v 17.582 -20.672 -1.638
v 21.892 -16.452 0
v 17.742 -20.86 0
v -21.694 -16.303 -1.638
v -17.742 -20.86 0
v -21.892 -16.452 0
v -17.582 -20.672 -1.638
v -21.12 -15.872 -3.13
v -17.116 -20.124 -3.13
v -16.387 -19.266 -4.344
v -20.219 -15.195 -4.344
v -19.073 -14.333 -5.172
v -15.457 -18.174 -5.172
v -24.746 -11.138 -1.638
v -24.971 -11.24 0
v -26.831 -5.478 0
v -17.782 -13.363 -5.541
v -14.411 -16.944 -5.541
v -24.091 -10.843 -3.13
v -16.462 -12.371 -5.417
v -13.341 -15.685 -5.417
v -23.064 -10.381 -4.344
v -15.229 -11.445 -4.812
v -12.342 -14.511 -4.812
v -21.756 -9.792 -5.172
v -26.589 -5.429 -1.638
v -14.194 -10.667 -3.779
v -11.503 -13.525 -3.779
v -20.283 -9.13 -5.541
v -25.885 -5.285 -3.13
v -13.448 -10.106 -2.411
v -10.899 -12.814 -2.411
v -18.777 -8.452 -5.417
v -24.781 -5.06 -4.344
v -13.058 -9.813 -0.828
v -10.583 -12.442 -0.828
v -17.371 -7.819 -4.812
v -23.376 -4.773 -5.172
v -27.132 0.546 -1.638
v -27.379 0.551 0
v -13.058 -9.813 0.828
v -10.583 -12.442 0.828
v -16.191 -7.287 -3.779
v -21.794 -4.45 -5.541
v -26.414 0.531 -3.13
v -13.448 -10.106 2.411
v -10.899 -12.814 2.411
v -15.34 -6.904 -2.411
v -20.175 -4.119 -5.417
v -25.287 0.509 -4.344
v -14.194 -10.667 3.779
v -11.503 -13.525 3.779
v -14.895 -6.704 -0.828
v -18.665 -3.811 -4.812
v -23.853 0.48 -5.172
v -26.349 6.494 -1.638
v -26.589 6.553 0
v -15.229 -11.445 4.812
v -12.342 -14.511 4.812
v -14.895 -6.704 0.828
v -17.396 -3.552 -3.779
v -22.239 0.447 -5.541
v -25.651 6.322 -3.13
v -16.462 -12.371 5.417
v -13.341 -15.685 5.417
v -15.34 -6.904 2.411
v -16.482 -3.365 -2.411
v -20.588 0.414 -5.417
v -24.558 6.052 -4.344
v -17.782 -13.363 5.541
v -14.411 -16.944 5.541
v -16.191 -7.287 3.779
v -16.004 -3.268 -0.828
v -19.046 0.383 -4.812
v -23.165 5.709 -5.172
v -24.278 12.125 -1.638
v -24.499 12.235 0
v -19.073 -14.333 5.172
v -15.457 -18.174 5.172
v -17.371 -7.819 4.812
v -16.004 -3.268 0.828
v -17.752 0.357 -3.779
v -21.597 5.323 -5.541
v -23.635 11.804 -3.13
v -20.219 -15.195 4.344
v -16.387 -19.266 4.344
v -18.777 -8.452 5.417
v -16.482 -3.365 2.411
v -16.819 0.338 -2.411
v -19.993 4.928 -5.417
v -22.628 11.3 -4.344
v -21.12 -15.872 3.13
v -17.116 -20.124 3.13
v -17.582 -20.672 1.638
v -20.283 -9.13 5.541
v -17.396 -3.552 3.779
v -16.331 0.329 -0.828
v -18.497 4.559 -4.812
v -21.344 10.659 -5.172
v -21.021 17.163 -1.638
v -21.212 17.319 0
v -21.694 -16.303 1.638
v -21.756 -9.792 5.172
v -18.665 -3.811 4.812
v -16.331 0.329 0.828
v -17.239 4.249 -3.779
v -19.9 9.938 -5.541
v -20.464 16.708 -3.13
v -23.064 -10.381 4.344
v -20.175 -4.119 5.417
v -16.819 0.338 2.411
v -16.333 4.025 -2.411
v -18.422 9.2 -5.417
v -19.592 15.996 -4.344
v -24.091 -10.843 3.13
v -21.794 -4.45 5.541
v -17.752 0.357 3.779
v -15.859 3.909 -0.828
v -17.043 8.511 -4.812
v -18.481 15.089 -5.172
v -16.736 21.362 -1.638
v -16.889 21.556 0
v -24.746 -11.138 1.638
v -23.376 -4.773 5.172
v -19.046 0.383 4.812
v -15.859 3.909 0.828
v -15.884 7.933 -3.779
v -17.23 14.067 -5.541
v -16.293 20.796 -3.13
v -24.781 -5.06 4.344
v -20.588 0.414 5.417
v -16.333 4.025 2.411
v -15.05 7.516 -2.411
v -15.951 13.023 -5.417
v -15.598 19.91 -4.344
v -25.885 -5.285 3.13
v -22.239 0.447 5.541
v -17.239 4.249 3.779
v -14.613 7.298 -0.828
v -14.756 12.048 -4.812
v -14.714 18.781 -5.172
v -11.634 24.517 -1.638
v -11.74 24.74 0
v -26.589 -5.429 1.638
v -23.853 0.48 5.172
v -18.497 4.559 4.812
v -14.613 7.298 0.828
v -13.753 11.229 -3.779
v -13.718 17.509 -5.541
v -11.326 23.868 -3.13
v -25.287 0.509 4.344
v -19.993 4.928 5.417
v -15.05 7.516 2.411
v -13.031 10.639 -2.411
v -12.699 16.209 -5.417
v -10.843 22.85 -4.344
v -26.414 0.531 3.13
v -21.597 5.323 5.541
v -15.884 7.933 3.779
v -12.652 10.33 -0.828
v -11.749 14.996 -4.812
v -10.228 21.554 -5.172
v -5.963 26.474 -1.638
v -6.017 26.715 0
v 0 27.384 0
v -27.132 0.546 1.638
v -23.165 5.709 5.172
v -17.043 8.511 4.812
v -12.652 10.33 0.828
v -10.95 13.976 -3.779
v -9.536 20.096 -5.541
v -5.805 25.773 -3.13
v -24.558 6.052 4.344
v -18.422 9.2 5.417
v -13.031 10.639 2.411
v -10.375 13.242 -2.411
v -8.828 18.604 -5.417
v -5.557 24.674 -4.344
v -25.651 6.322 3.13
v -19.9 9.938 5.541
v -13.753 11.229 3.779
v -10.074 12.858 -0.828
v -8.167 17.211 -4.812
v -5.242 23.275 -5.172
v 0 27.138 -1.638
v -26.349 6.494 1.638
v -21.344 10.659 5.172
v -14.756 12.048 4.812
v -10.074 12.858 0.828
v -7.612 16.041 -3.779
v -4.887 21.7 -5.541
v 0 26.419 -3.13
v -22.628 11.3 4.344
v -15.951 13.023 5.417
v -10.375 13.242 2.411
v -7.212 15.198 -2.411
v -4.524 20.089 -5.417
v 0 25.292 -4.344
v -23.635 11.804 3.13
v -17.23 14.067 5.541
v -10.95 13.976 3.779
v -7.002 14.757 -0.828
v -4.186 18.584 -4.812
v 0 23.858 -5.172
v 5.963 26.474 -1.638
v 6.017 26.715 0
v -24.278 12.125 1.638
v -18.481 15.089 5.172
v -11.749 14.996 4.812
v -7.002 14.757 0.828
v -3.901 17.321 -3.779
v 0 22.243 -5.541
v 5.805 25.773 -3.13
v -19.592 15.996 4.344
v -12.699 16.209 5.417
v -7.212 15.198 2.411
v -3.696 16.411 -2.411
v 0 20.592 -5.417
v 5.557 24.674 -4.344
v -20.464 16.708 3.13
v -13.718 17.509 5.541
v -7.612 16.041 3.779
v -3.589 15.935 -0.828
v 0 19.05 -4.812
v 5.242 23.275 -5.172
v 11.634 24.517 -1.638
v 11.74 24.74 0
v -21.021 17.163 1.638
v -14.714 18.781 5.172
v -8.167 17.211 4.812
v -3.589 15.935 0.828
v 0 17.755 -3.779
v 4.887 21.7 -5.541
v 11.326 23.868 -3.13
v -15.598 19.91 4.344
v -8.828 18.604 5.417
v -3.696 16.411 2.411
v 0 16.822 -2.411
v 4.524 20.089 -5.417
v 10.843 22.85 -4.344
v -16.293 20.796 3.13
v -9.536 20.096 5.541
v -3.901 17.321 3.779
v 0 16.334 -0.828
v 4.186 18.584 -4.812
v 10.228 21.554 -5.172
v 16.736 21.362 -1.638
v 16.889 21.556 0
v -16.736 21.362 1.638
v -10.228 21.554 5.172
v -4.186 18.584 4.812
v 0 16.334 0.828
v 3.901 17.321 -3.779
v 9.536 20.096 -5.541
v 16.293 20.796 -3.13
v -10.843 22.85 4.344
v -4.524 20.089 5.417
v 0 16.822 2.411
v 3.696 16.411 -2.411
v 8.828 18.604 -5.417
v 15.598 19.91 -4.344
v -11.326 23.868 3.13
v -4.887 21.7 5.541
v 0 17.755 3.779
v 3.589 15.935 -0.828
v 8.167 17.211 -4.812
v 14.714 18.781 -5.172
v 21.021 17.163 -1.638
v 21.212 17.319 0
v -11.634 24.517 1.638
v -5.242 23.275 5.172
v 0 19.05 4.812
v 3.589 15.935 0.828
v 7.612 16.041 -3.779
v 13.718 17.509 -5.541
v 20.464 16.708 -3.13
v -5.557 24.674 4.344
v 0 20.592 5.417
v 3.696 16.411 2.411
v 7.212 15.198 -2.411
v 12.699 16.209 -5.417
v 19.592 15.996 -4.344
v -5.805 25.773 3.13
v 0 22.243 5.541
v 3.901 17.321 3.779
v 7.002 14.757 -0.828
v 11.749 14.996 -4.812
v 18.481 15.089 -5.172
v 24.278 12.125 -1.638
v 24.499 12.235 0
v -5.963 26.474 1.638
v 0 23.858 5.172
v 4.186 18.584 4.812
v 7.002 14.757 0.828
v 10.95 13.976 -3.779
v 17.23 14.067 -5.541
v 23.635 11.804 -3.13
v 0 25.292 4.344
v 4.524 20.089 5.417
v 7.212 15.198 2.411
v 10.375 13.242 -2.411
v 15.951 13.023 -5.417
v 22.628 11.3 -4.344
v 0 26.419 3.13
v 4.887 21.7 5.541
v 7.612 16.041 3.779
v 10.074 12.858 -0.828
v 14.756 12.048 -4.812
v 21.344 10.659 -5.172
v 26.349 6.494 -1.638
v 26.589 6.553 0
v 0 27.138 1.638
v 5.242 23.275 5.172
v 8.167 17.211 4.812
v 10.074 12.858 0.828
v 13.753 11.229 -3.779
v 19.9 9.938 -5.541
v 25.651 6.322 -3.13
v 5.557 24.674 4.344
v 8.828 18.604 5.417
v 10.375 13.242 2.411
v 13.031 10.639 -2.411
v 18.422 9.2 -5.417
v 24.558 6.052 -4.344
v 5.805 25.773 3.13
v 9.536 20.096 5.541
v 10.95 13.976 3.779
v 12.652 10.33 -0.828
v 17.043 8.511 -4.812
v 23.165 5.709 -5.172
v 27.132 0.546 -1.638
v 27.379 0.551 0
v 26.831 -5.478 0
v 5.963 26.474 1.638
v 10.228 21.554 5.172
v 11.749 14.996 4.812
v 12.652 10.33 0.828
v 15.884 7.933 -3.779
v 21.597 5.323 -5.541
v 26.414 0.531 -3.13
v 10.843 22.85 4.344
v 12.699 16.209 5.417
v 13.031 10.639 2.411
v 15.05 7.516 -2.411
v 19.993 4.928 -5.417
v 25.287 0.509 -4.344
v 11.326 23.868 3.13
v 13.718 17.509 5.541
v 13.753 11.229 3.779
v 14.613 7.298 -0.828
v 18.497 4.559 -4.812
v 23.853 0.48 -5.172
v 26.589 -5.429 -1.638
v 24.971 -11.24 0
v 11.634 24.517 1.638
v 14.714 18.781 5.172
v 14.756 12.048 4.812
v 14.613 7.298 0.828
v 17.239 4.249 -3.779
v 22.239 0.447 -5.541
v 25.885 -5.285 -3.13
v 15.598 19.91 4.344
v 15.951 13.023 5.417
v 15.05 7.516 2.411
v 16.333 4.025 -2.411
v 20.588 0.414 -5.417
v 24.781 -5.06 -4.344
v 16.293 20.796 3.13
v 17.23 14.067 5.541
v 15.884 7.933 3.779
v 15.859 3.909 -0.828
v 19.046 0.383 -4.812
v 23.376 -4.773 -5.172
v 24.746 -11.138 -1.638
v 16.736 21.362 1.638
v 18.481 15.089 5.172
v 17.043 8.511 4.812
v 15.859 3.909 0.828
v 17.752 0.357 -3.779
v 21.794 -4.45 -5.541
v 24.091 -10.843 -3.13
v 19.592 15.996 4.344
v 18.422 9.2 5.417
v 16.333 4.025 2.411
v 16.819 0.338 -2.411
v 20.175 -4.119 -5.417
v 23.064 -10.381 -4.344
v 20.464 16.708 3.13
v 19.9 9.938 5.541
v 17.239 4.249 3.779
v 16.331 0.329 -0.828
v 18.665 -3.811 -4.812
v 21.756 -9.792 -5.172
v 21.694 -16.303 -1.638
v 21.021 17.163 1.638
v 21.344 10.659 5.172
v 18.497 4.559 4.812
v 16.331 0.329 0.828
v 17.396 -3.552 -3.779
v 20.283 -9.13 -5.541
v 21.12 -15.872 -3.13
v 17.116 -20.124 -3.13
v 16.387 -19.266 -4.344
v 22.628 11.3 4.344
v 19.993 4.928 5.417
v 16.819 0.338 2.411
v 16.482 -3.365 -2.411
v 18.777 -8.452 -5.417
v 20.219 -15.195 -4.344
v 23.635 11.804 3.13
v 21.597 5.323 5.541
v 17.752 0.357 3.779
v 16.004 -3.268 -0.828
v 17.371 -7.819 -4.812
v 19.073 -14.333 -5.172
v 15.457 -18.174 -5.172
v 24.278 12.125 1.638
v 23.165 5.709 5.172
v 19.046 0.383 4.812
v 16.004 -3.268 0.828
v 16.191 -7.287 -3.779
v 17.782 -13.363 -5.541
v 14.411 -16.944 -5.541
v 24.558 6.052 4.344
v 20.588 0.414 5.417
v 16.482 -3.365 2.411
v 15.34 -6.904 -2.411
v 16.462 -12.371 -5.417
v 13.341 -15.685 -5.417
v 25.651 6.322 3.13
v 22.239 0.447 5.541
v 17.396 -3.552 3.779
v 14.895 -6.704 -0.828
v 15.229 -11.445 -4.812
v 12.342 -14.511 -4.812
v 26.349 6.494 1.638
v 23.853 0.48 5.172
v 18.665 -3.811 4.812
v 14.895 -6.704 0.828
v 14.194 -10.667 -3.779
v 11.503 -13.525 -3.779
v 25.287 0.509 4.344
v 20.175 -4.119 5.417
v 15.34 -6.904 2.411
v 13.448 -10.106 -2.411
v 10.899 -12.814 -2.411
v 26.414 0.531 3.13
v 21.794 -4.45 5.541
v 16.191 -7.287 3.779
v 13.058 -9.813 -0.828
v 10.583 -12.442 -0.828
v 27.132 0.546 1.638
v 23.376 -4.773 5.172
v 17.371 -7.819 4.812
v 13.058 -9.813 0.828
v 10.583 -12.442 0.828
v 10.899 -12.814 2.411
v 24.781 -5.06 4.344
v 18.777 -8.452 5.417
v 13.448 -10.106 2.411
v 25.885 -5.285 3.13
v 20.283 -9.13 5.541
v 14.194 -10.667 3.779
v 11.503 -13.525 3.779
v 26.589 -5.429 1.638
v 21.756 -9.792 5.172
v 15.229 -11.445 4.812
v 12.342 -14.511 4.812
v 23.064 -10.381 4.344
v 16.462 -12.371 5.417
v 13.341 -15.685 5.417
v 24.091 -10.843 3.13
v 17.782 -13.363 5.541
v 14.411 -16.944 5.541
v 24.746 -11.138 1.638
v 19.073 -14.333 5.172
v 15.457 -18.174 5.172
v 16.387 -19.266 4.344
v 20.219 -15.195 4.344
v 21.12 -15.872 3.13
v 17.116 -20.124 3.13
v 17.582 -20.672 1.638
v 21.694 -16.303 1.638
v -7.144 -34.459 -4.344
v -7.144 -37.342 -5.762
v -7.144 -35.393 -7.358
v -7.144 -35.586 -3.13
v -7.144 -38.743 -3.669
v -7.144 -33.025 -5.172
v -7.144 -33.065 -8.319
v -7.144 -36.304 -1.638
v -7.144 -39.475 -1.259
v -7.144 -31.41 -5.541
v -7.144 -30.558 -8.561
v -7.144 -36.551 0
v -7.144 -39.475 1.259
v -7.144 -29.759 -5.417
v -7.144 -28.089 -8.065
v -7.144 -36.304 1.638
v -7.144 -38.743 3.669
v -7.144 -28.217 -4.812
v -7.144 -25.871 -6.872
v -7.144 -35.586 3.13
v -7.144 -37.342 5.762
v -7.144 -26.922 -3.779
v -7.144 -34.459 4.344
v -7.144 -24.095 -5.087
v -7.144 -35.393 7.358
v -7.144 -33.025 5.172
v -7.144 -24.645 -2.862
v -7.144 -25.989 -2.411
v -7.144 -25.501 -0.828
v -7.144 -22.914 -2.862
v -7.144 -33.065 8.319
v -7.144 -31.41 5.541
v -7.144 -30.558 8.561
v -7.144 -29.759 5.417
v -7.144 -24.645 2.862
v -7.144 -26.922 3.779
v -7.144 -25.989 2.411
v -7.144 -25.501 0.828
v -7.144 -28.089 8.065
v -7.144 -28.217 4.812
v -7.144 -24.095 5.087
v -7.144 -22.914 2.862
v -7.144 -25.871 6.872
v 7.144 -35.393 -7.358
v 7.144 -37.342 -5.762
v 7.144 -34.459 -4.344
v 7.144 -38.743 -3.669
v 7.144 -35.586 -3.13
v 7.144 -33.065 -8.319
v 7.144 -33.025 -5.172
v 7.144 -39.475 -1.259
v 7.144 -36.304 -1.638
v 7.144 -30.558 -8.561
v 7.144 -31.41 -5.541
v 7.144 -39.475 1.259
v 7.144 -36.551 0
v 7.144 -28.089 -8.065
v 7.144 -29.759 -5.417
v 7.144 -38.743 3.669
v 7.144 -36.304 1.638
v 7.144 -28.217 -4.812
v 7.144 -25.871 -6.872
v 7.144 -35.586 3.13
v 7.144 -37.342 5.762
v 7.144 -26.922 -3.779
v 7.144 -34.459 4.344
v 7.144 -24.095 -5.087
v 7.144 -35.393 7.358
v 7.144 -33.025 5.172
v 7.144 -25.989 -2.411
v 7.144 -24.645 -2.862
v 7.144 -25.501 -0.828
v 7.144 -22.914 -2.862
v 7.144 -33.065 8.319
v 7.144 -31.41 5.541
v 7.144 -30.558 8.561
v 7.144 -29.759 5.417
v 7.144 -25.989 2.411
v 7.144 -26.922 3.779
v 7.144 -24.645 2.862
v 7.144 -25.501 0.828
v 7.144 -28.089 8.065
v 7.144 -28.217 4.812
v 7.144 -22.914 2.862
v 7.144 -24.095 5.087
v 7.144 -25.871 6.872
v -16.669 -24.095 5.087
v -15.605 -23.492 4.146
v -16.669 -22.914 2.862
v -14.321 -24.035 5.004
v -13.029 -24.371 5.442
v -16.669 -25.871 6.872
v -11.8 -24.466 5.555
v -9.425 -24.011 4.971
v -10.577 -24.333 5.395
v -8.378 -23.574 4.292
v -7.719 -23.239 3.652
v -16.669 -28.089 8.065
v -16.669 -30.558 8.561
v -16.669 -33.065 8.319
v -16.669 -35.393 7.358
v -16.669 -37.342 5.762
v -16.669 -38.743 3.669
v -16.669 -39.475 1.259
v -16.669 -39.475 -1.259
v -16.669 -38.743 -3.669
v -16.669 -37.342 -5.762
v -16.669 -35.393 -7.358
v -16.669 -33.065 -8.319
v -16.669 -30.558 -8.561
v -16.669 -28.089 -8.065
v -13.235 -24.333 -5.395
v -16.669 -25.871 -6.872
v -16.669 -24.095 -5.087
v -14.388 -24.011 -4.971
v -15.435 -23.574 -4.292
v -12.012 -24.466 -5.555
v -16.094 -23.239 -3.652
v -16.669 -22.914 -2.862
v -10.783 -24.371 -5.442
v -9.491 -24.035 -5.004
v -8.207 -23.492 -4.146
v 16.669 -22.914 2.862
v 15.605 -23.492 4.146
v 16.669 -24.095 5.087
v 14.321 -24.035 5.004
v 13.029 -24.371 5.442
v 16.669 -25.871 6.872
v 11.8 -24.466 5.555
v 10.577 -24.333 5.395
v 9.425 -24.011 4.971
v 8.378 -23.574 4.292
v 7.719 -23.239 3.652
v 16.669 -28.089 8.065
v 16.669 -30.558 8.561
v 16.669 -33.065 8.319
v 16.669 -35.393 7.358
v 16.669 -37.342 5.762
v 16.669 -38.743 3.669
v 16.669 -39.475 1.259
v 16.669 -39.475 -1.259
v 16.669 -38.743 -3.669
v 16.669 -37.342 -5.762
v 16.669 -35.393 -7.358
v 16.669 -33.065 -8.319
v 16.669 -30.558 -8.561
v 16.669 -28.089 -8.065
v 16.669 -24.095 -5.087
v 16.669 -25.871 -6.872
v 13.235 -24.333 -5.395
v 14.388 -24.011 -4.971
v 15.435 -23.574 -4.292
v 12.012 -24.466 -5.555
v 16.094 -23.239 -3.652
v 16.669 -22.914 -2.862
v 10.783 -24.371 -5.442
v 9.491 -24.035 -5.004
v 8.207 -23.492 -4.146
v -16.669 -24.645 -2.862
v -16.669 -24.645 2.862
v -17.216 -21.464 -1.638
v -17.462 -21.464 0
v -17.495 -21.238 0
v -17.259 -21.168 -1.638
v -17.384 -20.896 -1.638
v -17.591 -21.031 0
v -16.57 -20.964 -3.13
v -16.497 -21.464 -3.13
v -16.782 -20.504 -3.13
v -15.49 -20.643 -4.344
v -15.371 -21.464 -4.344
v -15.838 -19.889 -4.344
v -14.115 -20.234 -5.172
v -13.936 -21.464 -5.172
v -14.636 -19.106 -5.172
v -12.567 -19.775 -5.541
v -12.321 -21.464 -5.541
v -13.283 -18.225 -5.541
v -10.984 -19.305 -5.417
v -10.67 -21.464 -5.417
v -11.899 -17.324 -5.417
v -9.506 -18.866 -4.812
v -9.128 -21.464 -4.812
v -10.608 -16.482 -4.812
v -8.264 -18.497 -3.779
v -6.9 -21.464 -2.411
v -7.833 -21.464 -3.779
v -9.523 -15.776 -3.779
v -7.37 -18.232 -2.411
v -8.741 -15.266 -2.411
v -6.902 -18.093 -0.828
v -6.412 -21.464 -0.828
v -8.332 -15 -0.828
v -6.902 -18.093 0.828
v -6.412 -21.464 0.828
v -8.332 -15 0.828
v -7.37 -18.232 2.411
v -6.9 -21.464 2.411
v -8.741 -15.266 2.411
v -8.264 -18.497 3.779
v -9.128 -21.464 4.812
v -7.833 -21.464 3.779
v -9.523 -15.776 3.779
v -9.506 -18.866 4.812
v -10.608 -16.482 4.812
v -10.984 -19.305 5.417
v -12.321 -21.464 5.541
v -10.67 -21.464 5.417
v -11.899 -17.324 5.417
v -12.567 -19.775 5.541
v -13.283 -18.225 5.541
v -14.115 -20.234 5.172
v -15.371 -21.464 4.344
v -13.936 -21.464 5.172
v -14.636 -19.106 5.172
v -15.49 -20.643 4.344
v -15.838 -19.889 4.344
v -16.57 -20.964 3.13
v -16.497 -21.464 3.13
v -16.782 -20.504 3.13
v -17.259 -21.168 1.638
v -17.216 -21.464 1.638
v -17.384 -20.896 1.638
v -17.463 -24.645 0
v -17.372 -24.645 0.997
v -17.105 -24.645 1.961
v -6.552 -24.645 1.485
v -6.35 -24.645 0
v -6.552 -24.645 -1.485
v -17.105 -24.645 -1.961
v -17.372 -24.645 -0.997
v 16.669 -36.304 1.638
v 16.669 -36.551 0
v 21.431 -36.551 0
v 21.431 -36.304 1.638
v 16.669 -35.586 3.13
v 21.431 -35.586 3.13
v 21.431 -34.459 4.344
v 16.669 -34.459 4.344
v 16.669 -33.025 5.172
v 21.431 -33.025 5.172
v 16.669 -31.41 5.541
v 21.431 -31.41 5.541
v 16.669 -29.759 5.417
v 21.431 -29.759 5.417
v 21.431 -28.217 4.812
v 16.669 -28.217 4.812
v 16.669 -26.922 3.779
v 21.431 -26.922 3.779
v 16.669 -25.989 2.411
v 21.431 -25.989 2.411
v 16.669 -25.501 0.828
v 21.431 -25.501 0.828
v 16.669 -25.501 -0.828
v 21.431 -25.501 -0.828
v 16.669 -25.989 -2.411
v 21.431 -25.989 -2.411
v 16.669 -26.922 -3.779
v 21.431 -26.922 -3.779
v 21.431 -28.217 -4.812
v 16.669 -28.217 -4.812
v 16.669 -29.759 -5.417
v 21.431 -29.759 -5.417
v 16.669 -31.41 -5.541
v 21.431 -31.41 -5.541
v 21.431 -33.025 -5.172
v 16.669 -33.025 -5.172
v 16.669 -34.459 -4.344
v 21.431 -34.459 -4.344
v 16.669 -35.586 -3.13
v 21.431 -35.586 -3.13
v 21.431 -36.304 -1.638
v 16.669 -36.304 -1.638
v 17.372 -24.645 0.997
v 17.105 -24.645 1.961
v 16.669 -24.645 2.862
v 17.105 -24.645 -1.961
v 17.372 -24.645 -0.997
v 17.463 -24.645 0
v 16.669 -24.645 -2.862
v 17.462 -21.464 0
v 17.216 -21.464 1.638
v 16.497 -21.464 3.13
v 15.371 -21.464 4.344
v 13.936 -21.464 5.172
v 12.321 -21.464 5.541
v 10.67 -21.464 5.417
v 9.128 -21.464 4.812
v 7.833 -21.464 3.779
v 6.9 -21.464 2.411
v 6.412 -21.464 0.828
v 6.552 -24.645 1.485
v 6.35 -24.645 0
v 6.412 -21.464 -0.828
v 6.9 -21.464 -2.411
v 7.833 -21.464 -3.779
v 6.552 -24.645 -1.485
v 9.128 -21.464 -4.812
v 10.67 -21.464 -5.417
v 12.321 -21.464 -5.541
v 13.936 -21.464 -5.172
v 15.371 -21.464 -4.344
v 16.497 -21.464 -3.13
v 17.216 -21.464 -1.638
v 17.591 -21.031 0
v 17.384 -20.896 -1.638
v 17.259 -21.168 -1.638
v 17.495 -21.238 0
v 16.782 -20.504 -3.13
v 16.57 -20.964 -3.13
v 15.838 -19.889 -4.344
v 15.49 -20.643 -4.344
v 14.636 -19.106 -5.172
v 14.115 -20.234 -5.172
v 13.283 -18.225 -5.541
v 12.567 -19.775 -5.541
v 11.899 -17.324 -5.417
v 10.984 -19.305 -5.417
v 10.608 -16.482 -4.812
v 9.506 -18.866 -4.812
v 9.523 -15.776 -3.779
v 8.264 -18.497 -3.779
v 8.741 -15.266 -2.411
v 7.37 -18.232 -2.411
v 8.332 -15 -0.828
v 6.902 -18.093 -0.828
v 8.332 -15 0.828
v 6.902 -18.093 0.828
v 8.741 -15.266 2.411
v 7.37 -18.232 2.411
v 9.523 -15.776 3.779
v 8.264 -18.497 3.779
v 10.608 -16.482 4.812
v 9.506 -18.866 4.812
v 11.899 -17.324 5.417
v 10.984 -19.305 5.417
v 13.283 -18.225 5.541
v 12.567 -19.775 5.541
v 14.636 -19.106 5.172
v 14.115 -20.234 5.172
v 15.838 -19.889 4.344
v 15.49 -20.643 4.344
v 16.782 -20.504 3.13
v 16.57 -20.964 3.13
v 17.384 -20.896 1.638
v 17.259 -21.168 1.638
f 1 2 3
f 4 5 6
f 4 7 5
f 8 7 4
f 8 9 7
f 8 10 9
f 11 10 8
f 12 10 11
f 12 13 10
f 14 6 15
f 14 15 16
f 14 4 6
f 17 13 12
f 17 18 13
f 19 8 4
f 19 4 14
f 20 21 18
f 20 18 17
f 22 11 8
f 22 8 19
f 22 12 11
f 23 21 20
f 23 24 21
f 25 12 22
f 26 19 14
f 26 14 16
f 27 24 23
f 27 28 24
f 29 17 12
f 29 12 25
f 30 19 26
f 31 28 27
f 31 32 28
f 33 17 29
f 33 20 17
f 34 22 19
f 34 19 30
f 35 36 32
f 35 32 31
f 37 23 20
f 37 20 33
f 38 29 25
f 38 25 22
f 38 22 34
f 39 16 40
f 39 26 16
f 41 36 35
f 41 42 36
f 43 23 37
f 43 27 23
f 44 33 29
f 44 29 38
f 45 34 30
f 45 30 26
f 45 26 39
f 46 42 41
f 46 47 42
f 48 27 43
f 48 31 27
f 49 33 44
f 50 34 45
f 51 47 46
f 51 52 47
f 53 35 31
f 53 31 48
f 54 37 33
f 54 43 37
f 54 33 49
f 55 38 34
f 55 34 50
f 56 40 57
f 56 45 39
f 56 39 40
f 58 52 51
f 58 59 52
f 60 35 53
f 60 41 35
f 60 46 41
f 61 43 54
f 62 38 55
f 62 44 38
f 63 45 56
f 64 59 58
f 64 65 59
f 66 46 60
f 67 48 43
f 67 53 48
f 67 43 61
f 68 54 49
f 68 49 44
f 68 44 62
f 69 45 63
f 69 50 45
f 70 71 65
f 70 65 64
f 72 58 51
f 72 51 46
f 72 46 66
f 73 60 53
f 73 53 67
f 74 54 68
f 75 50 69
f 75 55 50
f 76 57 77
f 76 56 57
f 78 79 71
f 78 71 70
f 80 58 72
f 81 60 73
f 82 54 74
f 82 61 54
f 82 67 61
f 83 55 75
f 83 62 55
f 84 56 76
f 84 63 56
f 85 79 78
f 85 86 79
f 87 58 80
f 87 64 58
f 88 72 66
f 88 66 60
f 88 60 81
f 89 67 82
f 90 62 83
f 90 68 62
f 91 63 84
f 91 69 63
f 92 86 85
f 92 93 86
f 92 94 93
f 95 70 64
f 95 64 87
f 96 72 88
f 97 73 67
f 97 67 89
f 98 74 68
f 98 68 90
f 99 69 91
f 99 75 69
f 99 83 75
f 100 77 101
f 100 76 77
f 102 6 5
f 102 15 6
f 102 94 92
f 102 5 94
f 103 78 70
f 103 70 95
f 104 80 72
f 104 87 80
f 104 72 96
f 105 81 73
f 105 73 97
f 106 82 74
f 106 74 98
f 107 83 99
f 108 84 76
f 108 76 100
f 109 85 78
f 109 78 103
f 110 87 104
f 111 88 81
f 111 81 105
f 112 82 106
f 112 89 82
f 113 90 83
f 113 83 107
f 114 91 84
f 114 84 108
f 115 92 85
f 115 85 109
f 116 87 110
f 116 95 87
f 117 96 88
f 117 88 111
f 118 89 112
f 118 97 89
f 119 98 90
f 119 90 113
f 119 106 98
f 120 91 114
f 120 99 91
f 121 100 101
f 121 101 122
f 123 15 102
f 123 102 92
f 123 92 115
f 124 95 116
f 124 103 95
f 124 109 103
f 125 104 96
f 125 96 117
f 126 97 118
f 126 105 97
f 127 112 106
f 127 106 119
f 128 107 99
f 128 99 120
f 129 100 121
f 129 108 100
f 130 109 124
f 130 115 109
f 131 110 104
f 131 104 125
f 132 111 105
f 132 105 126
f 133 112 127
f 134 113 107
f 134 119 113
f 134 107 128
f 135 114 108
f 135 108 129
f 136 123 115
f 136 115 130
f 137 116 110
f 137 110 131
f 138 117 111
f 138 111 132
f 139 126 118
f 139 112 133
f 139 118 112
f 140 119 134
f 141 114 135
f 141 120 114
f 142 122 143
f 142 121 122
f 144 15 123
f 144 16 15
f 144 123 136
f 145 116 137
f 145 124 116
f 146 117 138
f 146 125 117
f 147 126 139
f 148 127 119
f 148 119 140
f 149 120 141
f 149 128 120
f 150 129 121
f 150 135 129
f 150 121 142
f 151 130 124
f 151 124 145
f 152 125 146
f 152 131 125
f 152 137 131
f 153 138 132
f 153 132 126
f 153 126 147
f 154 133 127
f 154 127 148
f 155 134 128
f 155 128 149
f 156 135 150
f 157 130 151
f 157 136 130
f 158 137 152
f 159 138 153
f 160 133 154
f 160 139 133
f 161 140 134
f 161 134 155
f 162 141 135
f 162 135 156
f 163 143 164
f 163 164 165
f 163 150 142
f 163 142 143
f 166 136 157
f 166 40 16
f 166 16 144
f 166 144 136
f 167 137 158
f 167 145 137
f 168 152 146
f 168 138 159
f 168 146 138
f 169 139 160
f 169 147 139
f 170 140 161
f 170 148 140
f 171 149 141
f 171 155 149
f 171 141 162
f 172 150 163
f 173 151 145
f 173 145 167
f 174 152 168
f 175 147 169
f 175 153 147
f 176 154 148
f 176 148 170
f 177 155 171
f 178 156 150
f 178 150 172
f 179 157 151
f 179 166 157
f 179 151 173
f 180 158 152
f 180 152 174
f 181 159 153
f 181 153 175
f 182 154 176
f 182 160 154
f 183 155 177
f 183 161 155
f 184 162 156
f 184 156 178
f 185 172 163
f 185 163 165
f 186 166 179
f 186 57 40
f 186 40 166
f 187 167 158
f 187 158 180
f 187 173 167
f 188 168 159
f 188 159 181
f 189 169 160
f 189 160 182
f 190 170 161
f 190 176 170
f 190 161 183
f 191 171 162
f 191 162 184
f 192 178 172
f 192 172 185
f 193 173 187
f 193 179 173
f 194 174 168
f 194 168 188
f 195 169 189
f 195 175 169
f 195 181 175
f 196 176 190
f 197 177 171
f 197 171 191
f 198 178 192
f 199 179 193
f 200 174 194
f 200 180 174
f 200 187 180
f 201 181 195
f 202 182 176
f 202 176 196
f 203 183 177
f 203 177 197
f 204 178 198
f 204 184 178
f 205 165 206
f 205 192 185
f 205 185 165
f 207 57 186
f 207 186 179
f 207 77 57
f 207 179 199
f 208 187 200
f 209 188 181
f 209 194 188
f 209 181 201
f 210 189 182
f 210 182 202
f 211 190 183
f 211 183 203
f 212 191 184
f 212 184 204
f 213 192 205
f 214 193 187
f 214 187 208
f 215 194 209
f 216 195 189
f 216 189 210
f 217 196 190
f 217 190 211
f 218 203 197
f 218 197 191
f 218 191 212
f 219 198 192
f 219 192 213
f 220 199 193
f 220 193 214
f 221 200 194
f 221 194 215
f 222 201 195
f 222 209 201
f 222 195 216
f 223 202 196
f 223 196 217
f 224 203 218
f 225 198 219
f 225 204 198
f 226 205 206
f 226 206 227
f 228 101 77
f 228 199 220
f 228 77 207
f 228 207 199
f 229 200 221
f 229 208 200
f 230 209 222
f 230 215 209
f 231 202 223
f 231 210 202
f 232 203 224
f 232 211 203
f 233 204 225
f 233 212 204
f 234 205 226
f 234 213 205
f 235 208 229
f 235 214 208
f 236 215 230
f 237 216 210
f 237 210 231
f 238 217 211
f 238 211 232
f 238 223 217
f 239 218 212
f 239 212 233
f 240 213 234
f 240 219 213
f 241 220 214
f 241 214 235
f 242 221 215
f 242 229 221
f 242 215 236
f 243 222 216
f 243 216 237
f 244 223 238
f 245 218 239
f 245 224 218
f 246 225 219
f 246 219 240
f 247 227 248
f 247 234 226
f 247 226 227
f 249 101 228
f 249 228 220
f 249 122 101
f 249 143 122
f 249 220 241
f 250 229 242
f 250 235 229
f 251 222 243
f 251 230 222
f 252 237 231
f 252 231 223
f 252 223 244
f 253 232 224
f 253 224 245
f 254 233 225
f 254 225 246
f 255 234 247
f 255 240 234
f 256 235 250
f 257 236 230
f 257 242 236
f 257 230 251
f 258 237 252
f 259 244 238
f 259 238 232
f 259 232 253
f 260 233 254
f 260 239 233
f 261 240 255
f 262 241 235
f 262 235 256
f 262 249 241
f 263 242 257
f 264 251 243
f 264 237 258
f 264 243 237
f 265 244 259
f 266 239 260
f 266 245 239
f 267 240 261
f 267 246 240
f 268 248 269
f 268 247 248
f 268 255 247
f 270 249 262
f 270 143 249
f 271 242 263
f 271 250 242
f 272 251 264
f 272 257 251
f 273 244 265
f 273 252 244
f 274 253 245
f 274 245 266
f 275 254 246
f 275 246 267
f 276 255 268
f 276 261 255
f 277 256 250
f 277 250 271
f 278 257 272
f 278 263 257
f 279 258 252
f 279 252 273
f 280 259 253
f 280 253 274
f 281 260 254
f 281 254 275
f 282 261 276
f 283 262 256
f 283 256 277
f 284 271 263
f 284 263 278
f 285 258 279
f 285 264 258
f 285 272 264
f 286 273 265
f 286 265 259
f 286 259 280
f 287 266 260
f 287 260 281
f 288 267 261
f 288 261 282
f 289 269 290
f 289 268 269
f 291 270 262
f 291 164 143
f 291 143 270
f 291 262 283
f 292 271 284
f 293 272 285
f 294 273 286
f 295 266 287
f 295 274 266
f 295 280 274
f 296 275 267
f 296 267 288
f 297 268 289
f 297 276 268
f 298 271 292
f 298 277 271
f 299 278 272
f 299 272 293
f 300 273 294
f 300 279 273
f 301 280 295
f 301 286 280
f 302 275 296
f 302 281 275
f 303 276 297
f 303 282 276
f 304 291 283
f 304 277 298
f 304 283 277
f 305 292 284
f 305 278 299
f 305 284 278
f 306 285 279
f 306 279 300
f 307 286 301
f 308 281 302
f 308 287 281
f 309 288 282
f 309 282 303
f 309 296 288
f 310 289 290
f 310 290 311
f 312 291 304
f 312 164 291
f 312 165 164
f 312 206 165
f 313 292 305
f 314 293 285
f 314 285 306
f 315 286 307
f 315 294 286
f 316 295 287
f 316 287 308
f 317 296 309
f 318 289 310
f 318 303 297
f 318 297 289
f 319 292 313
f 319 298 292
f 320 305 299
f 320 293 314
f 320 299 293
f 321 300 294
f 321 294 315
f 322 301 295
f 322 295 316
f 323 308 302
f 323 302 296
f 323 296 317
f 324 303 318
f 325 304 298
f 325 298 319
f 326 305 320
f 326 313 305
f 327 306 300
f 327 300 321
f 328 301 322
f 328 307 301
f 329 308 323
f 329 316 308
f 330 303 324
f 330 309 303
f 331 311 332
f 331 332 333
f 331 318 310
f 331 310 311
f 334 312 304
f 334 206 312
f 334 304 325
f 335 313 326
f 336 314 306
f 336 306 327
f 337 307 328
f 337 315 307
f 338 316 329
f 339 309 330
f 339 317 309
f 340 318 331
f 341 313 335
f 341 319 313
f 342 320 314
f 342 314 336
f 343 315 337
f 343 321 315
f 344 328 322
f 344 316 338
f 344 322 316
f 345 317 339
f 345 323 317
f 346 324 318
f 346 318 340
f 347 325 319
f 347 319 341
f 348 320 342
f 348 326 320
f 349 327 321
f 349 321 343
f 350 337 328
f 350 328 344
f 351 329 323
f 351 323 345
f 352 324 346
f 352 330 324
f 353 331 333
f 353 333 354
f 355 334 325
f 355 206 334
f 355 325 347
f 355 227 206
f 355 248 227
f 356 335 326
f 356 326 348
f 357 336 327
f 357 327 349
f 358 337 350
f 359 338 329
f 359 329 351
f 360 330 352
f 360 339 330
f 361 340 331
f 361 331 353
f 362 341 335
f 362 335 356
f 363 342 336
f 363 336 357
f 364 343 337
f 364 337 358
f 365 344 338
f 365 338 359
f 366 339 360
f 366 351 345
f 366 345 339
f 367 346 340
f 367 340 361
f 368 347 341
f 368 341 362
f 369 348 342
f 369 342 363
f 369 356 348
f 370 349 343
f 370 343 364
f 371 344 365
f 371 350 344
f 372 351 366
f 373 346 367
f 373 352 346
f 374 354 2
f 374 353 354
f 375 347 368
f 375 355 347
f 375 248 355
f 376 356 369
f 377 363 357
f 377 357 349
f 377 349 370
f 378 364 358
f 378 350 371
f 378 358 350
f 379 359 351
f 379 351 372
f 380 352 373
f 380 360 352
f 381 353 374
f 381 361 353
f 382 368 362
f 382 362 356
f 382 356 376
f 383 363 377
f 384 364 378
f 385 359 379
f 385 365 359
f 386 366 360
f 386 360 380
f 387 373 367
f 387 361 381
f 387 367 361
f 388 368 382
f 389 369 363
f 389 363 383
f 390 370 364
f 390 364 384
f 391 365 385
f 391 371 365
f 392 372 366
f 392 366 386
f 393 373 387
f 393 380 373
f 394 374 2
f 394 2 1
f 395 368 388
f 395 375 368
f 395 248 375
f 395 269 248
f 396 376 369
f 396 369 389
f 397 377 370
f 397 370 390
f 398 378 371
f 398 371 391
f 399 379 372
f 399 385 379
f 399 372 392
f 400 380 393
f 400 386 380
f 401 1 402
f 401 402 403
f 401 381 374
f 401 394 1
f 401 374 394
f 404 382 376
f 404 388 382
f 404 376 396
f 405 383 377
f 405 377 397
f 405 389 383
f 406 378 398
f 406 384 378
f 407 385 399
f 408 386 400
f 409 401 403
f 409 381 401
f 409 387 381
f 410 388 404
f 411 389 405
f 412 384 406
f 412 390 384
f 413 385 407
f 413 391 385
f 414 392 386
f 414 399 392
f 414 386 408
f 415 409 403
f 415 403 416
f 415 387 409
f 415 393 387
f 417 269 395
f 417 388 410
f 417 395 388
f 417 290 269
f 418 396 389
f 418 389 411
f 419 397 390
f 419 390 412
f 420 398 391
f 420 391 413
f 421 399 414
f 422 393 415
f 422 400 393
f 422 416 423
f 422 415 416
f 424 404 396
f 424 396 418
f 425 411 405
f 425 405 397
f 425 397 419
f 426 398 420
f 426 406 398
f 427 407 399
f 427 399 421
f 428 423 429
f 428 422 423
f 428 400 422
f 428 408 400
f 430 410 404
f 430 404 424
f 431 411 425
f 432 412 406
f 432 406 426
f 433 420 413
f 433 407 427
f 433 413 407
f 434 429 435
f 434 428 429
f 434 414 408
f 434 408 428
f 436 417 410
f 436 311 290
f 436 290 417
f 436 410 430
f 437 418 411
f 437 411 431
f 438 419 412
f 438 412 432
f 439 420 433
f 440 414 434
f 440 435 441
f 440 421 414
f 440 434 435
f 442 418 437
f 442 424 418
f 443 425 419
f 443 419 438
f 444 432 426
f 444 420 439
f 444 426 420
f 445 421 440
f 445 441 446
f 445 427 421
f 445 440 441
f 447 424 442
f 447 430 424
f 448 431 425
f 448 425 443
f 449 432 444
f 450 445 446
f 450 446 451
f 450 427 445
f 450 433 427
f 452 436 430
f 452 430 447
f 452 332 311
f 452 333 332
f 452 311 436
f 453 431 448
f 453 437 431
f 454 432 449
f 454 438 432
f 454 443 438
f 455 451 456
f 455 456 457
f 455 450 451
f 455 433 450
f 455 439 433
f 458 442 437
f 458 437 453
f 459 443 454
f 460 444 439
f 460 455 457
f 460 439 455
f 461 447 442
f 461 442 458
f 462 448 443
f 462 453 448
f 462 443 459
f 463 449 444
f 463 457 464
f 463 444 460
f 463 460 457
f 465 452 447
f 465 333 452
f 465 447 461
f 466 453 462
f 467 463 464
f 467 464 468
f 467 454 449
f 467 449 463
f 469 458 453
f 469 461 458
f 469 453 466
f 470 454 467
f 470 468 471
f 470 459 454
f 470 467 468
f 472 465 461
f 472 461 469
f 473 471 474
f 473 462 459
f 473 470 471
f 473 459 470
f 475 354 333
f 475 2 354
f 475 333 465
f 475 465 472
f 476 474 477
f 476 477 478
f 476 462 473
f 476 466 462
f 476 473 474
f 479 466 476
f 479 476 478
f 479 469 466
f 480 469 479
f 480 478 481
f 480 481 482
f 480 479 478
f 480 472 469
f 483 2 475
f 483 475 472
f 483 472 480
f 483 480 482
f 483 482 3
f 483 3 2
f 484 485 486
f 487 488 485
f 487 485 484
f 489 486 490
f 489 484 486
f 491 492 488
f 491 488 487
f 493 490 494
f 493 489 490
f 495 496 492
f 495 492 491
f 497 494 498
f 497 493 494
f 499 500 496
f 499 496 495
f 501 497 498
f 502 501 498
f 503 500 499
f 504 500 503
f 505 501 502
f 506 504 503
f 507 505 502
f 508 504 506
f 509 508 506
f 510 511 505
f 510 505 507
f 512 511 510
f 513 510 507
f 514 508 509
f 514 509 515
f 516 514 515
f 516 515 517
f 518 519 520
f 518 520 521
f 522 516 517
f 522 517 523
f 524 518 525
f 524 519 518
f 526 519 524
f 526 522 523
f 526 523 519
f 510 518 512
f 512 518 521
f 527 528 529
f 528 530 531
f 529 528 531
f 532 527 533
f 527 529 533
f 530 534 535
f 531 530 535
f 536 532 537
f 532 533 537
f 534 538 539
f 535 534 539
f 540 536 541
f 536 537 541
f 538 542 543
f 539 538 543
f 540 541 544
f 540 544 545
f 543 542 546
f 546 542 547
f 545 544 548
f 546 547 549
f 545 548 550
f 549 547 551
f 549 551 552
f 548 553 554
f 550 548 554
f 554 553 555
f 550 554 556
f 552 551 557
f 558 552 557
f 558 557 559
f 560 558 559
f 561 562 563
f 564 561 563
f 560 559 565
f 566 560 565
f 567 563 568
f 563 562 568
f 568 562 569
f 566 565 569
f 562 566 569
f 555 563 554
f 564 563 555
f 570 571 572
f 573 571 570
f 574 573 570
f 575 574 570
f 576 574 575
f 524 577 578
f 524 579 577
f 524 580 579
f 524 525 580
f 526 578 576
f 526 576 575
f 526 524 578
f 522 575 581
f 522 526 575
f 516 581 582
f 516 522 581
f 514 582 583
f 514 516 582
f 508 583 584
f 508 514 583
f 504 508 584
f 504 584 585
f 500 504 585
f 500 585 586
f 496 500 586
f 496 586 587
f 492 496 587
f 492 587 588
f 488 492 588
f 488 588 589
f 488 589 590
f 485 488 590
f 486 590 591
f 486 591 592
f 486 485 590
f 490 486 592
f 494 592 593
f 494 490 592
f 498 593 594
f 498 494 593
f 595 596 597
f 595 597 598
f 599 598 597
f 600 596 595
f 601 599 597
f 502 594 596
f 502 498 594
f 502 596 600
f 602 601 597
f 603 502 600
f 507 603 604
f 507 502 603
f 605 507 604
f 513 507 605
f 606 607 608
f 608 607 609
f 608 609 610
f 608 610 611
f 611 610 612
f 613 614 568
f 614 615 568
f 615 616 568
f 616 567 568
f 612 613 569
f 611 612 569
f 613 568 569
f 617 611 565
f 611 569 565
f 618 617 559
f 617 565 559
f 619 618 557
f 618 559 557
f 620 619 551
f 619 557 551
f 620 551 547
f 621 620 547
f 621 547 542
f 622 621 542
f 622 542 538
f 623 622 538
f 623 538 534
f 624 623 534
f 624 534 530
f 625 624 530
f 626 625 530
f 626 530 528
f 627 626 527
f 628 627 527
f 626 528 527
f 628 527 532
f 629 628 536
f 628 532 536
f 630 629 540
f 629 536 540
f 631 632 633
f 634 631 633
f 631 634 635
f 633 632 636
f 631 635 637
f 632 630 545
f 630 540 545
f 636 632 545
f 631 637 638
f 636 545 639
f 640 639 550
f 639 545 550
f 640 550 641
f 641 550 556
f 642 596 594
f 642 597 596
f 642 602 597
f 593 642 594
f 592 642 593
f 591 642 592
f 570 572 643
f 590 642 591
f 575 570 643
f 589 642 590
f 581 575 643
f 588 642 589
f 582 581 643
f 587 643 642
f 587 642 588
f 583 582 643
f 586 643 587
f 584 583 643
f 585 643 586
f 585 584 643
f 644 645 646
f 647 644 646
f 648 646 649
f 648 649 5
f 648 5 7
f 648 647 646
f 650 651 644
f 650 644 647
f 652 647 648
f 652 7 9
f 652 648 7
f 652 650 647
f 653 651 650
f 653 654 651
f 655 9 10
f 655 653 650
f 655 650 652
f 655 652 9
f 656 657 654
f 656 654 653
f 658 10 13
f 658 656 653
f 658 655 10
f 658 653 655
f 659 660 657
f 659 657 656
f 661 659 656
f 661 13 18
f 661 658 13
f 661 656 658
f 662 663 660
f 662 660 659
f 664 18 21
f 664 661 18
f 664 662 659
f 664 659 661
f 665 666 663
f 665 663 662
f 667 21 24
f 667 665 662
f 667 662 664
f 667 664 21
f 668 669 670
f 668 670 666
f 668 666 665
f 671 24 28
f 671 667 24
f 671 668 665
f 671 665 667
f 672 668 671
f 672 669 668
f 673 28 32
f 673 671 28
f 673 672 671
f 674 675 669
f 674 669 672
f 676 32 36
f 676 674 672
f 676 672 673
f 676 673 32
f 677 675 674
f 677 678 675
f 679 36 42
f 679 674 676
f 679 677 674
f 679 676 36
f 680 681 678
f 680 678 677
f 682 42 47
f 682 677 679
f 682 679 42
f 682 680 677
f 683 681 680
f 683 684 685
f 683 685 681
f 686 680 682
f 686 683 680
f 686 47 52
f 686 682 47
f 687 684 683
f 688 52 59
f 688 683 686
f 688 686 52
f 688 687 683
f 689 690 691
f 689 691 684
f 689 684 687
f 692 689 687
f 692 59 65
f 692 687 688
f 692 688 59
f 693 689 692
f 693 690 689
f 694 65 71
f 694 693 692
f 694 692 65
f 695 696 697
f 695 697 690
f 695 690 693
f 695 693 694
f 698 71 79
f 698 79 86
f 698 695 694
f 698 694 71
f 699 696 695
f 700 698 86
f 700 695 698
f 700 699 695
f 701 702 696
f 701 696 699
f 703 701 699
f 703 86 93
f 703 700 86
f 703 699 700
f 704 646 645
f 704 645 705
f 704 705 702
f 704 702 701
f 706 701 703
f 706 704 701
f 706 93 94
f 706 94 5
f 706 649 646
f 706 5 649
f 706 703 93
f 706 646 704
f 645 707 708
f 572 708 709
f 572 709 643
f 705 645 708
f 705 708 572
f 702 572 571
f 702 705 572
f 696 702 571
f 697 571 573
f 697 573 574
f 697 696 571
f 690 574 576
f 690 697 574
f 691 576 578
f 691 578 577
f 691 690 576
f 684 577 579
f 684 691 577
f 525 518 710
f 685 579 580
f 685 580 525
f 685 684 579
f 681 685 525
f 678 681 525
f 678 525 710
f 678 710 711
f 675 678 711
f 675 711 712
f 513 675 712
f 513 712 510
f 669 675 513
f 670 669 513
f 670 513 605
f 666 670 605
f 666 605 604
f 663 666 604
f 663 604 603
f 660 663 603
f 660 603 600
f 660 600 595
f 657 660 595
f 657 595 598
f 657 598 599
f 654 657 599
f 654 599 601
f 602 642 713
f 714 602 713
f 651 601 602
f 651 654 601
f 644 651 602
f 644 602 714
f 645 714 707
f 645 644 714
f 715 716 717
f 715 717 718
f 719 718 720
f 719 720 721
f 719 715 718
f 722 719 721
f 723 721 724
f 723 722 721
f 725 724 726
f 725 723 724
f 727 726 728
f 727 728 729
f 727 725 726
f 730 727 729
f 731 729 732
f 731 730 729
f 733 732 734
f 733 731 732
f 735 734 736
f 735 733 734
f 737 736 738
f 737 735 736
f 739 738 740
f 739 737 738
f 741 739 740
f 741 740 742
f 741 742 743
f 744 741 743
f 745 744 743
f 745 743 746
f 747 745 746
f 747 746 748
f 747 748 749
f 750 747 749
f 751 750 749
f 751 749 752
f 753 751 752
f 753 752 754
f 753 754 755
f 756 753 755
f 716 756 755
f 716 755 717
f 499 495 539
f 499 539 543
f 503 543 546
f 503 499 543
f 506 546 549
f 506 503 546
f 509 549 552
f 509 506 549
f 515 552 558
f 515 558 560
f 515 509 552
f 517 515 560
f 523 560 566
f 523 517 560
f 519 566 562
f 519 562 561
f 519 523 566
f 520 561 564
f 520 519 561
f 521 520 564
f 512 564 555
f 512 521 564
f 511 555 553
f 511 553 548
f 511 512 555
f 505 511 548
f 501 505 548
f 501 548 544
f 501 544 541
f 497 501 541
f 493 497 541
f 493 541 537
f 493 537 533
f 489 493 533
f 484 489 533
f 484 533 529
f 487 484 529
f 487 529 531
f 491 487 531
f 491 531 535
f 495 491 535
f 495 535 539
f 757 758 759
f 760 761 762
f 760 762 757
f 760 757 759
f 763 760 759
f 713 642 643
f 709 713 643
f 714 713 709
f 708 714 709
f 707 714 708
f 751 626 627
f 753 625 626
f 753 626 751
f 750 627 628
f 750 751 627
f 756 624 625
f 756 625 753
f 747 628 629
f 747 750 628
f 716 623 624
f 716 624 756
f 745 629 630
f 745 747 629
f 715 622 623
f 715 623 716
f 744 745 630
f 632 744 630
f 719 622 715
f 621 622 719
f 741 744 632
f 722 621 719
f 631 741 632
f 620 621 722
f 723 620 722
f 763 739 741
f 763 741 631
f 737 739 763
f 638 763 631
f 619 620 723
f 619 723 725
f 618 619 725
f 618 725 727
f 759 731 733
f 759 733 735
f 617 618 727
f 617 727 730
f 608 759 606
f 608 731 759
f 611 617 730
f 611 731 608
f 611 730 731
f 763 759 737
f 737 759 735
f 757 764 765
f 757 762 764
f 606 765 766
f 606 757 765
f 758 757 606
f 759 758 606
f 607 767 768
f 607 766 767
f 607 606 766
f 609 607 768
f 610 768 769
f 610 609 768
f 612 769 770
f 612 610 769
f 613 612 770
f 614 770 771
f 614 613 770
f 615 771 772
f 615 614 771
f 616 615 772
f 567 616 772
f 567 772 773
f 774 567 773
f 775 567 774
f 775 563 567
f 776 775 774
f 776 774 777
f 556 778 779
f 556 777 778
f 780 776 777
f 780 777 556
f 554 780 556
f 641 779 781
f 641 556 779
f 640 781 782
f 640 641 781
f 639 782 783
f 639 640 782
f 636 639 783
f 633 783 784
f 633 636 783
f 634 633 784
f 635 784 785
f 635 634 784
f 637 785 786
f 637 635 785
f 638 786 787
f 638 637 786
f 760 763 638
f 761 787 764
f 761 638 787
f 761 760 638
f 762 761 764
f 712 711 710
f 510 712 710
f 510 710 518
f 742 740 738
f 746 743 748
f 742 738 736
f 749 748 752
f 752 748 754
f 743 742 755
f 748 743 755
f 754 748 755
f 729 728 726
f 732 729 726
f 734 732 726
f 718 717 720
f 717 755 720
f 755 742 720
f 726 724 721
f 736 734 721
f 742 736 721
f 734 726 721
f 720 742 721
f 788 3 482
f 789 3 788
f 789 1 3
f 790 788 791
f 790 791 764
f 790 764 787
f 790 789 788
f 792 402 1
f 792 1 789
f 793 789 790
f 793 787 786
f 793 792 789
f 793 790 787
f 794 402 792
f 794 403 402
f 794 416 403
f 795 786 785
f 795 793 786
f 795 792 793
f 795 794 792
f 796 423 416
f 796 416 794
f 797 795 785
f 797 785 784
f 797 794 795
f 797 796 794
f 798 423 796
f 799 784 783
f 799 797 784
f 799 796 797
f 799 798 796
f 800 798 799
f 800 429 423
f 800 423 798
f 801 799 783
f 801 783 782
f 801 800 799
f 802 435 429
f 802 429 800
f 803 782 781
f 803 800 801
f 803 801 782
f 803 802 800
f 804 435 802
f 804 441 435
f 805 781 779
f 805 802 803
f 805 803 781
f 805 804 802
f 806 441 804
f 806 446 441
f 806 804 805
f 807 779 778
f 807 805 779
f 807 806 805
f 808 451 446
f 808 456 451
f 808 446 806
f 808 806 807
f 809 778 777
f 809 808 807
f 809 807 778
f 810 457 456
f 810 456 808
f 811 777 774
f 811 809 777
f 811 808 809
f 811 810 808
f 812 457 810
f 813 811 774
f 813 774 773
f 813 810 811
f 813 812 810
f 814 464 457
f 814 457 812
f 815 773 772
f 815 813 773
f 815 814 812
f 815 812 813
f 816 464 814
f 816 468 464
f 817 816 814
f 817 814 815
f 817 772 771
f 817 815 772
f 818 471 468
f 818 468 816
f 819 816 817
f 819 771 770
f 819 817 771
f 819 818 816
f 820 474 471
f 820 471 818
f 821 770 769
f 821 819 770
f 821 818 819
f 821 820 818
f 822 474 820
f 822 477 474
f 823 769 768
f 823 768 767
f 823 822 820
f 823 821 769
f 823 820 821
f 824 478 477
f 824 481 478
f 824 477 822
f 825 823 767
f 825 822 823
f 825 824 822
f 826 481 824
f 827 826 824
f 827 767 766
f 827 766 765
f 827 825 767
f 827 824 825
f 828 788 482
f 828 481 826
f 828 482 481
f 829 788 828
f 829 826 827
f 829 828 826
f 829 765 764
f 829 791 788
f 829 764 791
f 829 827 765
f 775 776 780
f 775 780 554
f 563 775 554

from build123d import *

# Parameters (mm, degrees)
F2_R     = 5.55625
F5_R     = 8.5725
F6_DEPTH = 4.7625
F8_R     = 5.55625
F9_DEPTH = 38.1


with BuildPart() as f3:
    # F3: sweep along a path in F0
    with BuildLine(Plane.XY) as f3_path:
        Line((-11.90625, -24.6450335324), (-11.90625, -21.4642974367))
        ThreePointArc((-11.90625, -21.4642974367), (-12.4922697511, -18.7998966242), (-14.142165493, -16.6272726623))
        ThreePointArc((-14.142165493, -16.6272726623), (0, 21.828125), (14.142165493, -16.6272726623))
        ThreePointArc((14.142165493, -16.6272726623), (12.4922697511, -18.7998966242), (11.90625, -21.4642974367))
        Line((11.90625, -21.4642974367), (11.90625, -24.6450335324))
    # F2 (on line) → F3 (sweep)
    with BuildSketch(Plane(origin=(0, -24.6450335324, 0), x_dir=(-1, 0, 0), z_dir=(0, 1, 0))):
        with Locations((11.90625, 0)):
            Circle(F2_R)
    sweep(path=f3_path.line)

    # F5 (on plane+point) → F6 (join, symmetric)
    with BuildSketch(Plane.YZ.offset(-11.90625)):
        with Locations((-30.9950335324, 0)):
            Circle(F5_R)
    extrude(amount=F6_DEPTH, both=True)

    # F7: F3 across plane


with BuildPart() as f3_1:
    add(f3.part)
    add(f3.part.mirror(Plane.YZ))

    # F8 (on face) → F9 (join)
    with BuildSketch(Plane(origin=(-16.66875, 0, 0), x_dir=(0, -1, 0), z_dir=(-1, 0, 0))):
        with Locations((30.9950335324, 0)):
            Circle(F8_R)
    extrude(amount=-F9_DEPTH)


solid = f3_1.part
